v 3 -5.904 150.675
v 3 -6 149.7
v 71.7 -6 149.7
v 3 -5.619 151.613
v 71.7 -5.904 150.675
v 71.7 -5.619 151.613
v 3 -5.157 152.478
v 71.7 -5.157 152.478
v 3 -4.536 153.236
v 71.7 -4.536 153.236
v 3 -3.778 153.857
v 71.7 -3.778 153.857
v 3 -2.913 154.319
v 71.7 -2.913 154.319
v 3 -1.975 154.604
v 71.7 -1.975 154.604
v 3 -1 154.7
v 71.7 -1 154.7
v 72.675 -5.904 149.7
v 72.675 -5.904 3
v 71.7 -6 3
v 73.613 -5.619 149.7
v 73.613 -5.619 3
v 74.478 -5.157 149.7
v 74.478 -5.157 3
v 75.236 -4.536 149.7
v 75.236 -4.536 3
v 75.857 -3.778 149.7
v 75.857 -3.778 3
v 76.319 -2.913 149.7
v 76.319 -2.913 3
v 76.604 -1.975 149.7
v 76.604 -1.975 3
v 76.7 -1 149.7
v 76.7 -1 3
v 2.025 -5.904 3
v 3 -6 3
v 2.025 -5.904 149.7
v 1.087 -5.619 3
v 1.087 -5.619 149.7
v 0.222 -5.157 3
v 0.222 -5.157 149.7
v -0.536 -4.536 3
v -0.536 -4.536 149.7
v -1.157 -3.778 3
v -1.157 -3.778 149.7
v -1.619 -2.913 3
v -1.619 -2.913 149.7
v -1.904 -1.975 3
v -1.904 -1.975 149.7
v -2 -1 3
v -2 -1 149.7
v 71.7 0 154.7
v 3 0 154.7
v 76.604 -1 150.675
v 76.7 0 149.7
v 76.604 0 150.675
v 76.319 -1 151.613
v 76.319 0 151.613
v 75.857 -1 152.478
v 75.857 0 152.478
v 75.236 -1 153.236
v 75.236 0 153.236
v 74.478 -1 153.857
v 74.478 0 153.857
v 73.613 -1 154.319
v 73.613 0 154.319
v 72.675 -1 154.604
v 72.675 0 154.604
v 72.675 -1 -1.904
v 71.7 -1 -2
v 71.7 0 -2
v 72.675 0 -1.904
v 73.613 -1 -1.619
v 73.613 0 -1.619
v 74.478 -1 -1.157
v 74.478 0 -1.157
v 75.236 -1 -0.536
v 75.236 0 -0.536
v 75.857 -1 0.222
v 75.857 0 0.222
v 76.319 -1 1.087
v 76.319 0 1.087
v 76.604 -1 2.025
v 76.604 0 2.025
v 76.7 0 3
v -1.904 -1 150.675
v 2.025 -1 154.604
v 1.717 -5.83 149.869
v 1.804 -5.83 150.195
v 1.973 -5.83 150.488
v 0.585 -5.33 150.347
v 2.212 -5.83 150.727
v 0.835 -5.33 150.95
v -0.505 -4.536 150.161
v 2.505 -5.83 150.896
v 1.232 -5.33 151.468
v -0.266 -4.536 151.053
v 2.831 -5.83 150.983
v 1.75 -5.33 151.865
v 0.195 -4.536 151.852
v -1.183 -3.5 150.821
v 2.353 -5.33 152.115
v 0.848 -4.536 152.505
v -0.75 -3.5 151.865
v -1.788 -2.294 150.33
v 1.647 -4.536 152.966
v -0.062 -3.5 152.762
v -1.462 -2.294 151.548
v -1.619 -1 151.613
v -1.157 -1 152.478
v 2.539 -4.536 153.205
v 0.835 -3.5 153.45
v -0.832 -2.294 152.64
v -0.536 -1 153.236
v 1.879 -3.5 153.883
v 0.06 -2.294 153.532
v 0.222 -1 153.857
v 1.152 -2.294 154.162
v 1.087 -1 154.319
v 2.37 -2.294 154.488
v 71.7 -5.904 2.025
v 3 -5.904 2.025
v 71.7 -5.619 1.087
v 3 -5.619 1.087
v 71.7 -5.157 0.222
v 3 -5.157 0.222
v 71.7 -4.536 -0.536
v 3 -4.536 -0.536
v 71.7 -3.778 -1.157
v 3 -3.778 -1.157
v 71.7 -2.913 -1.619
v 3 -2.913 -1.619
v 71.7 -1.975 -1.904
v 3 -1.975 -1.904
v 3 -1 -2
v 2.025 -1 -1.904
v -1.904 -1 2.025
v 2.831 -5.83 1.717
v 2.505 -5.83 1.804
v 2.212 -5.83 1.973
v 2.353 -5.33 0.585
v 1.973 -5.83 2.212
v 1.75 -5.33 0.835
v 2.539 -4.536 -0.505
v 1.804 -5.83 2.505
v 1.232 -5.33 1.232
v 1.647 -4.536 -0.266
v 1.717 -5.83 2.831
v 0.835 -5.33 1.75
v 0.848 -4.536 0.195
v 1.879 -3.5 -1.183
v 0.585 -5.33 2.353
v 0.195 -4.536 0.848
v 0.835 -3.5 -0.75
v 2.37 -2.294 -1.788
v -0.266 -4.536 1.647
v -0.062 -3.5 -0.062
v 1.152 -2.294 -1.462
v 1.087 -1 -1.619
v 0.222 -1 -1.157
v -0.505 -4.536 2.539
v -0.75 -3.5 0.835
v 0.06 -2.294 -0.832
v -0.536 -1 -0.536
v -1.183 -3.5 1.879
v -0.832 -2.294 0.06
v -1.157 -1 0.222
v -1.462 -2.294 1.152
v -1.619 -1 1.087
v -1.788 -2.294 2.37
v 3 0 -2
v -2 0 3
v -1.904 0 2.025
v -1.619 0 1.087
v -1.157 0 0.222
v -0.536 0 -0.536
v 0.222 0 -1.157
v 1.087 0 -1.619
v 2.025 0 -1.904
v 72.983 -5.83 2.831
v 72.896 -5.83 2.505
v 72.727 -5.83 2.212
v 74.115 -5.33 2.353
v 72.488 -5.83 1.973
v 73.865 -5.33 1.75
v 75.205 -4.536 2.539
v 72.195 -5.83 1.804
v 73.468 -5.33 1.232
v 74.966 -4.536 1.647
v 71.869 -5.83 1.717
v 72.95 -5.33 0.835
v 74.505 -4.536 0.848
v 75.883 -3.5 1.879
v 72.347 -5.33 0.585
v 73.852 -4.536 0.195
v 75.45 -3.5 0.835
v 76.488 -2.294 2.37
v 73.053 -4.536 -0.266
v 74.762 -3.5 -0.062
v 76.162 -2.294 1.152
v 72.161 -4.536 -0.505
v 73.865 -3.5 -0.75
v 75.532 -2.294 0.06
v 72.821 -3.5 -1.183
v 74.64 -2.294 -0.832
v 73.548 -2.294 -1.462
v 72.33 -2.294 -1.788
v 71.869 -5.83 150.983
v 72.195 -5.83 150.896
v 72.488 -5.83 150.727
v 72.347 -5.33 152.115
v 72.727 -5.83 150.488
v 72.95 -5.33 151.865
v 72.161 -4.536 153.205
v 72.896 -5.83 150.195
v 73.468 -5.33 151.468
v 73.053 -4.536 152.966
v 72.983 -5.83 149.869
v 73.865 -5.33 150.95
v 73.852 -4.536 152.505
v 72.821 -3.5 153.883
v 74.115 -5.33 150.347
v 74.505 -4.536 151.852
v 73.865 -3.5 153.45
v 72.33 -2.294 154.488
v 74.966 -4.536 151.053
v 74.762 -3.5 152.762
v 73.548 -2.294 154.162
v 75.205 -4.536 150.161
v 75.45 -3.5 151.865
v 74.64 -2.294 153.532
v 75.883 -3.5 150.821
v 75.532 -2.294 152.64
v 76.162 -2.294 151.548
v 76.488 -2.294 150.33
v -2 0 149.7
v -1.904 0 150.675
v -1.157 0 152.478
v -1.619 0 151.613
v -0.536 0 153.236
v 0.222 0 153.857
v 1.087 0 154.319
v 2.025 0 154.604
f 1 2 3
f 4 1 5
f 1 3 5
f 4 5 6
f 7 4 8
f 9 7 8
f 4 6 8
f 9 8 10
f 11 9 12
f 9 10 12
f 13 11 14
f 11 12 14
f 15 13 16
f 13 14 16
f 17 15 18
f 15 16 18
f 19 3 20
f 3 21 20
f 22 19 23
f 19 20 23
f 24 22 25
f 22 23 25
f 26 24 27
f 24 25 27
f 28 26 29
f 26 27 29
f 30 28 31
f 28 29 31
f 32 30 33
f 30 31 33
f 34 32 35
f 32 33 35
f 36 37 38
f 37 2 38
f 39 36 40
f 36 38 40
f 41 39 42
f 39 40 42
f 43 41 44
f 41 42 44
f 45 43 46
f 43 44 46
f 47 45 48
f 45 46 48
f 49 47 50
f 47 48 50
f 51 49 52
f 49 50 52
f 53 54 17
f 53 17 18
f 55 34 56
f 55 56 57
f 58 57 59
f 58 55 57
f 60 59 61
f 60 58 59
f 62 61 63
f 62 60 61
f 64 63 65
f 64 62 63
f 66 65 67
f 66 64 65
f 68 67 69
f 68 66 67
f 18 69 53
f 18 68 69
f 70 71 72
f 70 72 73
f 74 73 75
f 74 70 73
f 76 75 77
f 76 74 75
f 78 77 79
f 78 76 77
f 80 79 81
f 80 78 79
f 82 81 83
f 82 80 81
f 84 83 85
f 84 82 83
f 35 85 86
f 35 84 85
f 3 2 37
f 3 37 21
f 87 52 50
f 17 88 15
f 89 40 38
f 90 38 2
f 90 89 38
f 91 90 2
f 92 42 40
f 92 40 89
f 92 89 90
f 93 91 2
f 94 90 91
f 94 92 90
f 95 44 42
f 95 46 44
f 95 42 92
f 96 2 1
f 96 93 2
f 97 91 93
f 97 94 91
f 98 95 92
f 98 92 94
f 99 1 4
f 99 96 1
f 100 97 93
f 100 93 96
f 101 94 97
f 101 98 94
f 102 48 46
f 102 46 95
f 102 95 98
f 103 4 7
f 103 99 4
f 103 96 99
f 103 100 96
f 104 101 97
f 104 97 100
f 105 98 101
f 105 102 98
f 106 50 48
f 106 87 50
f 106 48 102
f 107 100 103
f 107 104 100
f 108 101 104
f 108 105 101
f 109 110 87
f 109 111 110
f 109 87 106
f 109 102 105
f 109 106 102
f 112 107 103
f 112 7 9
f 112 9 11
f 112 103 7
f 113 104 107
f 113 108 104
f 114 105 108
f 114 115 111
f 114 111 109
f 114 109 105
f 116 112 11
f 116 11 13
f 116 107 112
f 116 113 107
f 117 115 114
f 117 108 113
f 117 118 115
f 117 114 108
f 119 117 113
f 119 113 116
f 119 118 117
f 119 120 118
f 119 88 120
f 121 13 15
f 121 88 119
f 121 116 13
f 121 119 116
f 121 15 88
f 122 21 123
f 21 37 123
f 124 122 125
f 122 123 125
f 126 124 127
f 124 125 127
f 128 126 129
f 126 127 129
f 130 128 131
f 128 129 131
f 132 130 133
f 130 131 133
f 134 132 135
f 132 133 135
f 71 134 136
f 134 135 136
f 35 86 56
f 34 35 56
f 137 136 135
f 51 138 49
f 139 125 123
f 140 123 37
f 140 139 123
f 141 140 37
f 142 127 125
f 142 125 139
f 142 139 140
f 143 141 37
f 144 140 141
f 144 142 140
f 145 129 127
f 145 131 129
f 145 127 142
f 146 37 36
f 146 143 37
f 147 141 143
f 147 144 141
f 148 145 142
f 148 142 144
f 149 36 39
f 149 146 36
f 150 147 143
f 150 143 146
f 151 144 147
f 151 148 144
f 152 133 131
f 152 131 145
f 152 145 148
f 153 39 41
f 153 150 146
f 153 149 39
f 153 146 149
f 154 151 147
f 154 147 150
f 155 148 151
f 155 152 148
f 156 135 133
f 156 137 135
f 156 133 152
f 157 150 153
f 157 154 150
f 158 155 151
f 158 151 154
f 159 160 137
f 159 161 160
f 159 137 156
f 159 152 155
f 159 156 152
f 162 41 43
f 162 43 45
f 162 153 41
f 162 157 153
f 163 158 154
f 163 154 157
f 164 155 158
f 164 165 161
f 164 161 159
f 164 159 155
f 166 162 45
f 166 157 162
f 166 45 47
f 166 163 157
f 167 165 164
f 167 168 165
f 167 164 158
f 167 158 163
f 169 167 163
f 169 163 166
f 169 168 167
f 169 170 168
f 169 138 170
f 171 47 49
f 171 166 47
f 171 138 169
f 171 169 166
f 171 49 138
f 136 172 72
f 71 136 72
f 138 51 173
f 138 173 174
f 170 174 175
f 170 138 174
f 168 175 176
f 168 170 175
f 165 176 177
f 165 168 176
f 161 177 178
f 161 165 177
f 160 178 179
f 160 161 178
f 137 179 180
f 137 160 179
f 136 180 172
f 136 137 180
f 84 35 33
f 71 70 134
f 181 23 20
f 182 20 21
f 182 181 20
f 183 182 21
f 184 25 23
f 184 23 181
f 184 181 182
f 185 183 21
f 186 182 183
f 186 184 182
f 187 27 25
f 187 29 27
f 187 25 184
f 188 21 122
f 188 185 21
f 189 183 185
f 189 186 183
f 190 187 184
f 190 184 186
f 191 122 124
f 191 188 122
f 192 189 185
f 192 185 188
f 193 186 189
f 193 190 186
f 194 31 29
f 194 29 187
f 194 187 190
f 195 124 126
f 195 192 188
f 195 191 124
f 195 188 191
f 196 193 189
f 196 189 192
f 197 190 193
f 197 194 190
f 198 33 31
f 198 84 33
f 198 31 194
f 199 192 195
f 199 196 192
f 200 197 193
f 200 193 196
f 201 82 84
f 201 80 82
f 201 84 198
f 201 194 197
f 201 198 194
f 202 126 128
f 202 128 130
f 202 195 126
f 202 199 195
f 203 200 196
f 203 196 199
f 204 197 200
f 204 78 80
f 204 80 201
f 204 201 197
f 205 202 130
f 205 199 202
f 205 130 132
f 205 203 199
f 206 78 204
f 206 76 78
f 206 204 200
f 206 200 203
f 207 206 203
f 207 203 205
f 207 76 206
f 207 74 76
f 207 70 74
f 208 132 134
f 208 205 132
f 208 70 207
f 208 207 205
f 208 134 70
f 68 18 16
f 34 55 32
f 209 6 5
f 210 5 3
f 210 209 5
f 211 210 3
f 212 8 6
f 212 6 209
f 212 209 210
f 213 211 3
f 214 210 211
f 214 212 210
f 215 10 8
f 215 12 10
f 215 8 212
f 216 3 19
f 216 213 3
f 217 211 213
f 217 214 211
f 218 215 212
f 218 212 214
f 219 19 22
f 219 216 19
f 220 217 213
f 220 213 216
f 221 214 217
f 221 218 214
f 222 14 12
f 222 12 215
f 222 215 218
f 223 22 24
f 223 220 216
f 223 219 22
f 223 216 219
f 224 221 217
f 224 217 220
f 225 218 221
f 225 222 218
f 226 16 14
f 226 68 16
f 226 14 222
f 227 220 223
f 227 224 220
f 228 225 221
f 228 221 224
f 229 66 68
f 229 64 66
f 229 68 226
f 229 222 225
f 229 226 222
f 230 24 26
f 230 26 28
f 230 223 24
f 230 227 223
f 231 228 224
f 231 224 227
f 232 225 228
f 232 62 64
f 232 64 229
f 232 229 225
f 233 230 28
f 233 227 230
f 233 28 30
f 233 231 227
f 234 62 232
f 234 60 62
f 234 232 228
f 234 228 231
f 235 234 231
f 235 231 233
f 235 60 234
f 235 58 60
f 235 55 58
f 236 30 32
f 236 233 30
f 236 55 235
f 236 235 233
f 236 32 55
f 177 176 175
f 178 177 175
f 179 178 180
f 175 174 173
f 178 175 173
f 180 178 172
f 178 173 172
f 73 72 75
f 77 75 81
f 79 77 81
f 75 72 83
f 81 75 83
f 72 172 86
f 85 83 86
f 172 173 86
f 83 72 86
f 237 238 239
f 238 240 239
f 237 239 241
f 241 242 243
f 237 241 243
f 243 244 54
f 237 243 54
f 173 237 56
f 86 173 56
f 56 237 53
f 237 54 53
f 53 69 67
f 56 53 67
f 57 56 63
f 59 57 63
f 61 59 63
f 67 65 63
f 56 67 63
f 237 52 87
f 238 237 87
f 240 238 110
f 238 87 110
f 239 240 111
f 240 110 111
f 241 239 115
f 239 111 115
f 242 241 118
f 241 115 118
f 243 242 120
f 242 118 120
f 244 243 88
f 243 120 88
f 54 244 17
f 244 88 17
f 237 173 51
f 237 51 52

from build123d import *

# Parameters (mm, degrees)
F0_W     = 78.7
F0_H     = 156.7
F0_W_2   = 74.7
F0_H_2   = 152.7
F1_DEPTH = 6
F2_R     = 5
F3_R     = 5


with BuildPart() as f1:
    # F0 (on Front) → F1 (new body)
    with BuildSketch(Plane.XZ):
        with Locations((37.35, 76.35)):
            Rectangle(F0_W, F0_H)
        with Locations((37.35, 76.35)):
            Rectangle(F0_W_2, F0_H_2, mode=Mode.SUBTRACT)
        with Locations((37.35, 76.35)):
            Rectangle(F0_W_2, F0_H_2)
    extrude(amount=F1_DEPTH)

    # F2
    f2_edges = [f1.edges().sort_by_distance(p)[0] for p in [
        (-2, -3, -2),
        (76.7, -3, -2),
        (-2, -3, 154.7),
        (76.7, -3, 154.7),
    ]]
    fillet(f2_edges, radius=F2_R)

    # F3
    f3_edges = [f1.edges().sort_by_distance(p)[0] for p in [
        (37.35, -6, 154.7),
        (75.235534, -6, 153.235534),
        (-0.535534, -6, 153.235534),
        (76.7, -6, 76.35),
        (-2, -6, 76.35),
        (75.235534, -6, -0.535534),
        (-0.535534, -6, -0.535534),
        (37.35, -6, -2),
    ]]
    fillet(f3_edges, radius=F3_R)


solid = f1.part
